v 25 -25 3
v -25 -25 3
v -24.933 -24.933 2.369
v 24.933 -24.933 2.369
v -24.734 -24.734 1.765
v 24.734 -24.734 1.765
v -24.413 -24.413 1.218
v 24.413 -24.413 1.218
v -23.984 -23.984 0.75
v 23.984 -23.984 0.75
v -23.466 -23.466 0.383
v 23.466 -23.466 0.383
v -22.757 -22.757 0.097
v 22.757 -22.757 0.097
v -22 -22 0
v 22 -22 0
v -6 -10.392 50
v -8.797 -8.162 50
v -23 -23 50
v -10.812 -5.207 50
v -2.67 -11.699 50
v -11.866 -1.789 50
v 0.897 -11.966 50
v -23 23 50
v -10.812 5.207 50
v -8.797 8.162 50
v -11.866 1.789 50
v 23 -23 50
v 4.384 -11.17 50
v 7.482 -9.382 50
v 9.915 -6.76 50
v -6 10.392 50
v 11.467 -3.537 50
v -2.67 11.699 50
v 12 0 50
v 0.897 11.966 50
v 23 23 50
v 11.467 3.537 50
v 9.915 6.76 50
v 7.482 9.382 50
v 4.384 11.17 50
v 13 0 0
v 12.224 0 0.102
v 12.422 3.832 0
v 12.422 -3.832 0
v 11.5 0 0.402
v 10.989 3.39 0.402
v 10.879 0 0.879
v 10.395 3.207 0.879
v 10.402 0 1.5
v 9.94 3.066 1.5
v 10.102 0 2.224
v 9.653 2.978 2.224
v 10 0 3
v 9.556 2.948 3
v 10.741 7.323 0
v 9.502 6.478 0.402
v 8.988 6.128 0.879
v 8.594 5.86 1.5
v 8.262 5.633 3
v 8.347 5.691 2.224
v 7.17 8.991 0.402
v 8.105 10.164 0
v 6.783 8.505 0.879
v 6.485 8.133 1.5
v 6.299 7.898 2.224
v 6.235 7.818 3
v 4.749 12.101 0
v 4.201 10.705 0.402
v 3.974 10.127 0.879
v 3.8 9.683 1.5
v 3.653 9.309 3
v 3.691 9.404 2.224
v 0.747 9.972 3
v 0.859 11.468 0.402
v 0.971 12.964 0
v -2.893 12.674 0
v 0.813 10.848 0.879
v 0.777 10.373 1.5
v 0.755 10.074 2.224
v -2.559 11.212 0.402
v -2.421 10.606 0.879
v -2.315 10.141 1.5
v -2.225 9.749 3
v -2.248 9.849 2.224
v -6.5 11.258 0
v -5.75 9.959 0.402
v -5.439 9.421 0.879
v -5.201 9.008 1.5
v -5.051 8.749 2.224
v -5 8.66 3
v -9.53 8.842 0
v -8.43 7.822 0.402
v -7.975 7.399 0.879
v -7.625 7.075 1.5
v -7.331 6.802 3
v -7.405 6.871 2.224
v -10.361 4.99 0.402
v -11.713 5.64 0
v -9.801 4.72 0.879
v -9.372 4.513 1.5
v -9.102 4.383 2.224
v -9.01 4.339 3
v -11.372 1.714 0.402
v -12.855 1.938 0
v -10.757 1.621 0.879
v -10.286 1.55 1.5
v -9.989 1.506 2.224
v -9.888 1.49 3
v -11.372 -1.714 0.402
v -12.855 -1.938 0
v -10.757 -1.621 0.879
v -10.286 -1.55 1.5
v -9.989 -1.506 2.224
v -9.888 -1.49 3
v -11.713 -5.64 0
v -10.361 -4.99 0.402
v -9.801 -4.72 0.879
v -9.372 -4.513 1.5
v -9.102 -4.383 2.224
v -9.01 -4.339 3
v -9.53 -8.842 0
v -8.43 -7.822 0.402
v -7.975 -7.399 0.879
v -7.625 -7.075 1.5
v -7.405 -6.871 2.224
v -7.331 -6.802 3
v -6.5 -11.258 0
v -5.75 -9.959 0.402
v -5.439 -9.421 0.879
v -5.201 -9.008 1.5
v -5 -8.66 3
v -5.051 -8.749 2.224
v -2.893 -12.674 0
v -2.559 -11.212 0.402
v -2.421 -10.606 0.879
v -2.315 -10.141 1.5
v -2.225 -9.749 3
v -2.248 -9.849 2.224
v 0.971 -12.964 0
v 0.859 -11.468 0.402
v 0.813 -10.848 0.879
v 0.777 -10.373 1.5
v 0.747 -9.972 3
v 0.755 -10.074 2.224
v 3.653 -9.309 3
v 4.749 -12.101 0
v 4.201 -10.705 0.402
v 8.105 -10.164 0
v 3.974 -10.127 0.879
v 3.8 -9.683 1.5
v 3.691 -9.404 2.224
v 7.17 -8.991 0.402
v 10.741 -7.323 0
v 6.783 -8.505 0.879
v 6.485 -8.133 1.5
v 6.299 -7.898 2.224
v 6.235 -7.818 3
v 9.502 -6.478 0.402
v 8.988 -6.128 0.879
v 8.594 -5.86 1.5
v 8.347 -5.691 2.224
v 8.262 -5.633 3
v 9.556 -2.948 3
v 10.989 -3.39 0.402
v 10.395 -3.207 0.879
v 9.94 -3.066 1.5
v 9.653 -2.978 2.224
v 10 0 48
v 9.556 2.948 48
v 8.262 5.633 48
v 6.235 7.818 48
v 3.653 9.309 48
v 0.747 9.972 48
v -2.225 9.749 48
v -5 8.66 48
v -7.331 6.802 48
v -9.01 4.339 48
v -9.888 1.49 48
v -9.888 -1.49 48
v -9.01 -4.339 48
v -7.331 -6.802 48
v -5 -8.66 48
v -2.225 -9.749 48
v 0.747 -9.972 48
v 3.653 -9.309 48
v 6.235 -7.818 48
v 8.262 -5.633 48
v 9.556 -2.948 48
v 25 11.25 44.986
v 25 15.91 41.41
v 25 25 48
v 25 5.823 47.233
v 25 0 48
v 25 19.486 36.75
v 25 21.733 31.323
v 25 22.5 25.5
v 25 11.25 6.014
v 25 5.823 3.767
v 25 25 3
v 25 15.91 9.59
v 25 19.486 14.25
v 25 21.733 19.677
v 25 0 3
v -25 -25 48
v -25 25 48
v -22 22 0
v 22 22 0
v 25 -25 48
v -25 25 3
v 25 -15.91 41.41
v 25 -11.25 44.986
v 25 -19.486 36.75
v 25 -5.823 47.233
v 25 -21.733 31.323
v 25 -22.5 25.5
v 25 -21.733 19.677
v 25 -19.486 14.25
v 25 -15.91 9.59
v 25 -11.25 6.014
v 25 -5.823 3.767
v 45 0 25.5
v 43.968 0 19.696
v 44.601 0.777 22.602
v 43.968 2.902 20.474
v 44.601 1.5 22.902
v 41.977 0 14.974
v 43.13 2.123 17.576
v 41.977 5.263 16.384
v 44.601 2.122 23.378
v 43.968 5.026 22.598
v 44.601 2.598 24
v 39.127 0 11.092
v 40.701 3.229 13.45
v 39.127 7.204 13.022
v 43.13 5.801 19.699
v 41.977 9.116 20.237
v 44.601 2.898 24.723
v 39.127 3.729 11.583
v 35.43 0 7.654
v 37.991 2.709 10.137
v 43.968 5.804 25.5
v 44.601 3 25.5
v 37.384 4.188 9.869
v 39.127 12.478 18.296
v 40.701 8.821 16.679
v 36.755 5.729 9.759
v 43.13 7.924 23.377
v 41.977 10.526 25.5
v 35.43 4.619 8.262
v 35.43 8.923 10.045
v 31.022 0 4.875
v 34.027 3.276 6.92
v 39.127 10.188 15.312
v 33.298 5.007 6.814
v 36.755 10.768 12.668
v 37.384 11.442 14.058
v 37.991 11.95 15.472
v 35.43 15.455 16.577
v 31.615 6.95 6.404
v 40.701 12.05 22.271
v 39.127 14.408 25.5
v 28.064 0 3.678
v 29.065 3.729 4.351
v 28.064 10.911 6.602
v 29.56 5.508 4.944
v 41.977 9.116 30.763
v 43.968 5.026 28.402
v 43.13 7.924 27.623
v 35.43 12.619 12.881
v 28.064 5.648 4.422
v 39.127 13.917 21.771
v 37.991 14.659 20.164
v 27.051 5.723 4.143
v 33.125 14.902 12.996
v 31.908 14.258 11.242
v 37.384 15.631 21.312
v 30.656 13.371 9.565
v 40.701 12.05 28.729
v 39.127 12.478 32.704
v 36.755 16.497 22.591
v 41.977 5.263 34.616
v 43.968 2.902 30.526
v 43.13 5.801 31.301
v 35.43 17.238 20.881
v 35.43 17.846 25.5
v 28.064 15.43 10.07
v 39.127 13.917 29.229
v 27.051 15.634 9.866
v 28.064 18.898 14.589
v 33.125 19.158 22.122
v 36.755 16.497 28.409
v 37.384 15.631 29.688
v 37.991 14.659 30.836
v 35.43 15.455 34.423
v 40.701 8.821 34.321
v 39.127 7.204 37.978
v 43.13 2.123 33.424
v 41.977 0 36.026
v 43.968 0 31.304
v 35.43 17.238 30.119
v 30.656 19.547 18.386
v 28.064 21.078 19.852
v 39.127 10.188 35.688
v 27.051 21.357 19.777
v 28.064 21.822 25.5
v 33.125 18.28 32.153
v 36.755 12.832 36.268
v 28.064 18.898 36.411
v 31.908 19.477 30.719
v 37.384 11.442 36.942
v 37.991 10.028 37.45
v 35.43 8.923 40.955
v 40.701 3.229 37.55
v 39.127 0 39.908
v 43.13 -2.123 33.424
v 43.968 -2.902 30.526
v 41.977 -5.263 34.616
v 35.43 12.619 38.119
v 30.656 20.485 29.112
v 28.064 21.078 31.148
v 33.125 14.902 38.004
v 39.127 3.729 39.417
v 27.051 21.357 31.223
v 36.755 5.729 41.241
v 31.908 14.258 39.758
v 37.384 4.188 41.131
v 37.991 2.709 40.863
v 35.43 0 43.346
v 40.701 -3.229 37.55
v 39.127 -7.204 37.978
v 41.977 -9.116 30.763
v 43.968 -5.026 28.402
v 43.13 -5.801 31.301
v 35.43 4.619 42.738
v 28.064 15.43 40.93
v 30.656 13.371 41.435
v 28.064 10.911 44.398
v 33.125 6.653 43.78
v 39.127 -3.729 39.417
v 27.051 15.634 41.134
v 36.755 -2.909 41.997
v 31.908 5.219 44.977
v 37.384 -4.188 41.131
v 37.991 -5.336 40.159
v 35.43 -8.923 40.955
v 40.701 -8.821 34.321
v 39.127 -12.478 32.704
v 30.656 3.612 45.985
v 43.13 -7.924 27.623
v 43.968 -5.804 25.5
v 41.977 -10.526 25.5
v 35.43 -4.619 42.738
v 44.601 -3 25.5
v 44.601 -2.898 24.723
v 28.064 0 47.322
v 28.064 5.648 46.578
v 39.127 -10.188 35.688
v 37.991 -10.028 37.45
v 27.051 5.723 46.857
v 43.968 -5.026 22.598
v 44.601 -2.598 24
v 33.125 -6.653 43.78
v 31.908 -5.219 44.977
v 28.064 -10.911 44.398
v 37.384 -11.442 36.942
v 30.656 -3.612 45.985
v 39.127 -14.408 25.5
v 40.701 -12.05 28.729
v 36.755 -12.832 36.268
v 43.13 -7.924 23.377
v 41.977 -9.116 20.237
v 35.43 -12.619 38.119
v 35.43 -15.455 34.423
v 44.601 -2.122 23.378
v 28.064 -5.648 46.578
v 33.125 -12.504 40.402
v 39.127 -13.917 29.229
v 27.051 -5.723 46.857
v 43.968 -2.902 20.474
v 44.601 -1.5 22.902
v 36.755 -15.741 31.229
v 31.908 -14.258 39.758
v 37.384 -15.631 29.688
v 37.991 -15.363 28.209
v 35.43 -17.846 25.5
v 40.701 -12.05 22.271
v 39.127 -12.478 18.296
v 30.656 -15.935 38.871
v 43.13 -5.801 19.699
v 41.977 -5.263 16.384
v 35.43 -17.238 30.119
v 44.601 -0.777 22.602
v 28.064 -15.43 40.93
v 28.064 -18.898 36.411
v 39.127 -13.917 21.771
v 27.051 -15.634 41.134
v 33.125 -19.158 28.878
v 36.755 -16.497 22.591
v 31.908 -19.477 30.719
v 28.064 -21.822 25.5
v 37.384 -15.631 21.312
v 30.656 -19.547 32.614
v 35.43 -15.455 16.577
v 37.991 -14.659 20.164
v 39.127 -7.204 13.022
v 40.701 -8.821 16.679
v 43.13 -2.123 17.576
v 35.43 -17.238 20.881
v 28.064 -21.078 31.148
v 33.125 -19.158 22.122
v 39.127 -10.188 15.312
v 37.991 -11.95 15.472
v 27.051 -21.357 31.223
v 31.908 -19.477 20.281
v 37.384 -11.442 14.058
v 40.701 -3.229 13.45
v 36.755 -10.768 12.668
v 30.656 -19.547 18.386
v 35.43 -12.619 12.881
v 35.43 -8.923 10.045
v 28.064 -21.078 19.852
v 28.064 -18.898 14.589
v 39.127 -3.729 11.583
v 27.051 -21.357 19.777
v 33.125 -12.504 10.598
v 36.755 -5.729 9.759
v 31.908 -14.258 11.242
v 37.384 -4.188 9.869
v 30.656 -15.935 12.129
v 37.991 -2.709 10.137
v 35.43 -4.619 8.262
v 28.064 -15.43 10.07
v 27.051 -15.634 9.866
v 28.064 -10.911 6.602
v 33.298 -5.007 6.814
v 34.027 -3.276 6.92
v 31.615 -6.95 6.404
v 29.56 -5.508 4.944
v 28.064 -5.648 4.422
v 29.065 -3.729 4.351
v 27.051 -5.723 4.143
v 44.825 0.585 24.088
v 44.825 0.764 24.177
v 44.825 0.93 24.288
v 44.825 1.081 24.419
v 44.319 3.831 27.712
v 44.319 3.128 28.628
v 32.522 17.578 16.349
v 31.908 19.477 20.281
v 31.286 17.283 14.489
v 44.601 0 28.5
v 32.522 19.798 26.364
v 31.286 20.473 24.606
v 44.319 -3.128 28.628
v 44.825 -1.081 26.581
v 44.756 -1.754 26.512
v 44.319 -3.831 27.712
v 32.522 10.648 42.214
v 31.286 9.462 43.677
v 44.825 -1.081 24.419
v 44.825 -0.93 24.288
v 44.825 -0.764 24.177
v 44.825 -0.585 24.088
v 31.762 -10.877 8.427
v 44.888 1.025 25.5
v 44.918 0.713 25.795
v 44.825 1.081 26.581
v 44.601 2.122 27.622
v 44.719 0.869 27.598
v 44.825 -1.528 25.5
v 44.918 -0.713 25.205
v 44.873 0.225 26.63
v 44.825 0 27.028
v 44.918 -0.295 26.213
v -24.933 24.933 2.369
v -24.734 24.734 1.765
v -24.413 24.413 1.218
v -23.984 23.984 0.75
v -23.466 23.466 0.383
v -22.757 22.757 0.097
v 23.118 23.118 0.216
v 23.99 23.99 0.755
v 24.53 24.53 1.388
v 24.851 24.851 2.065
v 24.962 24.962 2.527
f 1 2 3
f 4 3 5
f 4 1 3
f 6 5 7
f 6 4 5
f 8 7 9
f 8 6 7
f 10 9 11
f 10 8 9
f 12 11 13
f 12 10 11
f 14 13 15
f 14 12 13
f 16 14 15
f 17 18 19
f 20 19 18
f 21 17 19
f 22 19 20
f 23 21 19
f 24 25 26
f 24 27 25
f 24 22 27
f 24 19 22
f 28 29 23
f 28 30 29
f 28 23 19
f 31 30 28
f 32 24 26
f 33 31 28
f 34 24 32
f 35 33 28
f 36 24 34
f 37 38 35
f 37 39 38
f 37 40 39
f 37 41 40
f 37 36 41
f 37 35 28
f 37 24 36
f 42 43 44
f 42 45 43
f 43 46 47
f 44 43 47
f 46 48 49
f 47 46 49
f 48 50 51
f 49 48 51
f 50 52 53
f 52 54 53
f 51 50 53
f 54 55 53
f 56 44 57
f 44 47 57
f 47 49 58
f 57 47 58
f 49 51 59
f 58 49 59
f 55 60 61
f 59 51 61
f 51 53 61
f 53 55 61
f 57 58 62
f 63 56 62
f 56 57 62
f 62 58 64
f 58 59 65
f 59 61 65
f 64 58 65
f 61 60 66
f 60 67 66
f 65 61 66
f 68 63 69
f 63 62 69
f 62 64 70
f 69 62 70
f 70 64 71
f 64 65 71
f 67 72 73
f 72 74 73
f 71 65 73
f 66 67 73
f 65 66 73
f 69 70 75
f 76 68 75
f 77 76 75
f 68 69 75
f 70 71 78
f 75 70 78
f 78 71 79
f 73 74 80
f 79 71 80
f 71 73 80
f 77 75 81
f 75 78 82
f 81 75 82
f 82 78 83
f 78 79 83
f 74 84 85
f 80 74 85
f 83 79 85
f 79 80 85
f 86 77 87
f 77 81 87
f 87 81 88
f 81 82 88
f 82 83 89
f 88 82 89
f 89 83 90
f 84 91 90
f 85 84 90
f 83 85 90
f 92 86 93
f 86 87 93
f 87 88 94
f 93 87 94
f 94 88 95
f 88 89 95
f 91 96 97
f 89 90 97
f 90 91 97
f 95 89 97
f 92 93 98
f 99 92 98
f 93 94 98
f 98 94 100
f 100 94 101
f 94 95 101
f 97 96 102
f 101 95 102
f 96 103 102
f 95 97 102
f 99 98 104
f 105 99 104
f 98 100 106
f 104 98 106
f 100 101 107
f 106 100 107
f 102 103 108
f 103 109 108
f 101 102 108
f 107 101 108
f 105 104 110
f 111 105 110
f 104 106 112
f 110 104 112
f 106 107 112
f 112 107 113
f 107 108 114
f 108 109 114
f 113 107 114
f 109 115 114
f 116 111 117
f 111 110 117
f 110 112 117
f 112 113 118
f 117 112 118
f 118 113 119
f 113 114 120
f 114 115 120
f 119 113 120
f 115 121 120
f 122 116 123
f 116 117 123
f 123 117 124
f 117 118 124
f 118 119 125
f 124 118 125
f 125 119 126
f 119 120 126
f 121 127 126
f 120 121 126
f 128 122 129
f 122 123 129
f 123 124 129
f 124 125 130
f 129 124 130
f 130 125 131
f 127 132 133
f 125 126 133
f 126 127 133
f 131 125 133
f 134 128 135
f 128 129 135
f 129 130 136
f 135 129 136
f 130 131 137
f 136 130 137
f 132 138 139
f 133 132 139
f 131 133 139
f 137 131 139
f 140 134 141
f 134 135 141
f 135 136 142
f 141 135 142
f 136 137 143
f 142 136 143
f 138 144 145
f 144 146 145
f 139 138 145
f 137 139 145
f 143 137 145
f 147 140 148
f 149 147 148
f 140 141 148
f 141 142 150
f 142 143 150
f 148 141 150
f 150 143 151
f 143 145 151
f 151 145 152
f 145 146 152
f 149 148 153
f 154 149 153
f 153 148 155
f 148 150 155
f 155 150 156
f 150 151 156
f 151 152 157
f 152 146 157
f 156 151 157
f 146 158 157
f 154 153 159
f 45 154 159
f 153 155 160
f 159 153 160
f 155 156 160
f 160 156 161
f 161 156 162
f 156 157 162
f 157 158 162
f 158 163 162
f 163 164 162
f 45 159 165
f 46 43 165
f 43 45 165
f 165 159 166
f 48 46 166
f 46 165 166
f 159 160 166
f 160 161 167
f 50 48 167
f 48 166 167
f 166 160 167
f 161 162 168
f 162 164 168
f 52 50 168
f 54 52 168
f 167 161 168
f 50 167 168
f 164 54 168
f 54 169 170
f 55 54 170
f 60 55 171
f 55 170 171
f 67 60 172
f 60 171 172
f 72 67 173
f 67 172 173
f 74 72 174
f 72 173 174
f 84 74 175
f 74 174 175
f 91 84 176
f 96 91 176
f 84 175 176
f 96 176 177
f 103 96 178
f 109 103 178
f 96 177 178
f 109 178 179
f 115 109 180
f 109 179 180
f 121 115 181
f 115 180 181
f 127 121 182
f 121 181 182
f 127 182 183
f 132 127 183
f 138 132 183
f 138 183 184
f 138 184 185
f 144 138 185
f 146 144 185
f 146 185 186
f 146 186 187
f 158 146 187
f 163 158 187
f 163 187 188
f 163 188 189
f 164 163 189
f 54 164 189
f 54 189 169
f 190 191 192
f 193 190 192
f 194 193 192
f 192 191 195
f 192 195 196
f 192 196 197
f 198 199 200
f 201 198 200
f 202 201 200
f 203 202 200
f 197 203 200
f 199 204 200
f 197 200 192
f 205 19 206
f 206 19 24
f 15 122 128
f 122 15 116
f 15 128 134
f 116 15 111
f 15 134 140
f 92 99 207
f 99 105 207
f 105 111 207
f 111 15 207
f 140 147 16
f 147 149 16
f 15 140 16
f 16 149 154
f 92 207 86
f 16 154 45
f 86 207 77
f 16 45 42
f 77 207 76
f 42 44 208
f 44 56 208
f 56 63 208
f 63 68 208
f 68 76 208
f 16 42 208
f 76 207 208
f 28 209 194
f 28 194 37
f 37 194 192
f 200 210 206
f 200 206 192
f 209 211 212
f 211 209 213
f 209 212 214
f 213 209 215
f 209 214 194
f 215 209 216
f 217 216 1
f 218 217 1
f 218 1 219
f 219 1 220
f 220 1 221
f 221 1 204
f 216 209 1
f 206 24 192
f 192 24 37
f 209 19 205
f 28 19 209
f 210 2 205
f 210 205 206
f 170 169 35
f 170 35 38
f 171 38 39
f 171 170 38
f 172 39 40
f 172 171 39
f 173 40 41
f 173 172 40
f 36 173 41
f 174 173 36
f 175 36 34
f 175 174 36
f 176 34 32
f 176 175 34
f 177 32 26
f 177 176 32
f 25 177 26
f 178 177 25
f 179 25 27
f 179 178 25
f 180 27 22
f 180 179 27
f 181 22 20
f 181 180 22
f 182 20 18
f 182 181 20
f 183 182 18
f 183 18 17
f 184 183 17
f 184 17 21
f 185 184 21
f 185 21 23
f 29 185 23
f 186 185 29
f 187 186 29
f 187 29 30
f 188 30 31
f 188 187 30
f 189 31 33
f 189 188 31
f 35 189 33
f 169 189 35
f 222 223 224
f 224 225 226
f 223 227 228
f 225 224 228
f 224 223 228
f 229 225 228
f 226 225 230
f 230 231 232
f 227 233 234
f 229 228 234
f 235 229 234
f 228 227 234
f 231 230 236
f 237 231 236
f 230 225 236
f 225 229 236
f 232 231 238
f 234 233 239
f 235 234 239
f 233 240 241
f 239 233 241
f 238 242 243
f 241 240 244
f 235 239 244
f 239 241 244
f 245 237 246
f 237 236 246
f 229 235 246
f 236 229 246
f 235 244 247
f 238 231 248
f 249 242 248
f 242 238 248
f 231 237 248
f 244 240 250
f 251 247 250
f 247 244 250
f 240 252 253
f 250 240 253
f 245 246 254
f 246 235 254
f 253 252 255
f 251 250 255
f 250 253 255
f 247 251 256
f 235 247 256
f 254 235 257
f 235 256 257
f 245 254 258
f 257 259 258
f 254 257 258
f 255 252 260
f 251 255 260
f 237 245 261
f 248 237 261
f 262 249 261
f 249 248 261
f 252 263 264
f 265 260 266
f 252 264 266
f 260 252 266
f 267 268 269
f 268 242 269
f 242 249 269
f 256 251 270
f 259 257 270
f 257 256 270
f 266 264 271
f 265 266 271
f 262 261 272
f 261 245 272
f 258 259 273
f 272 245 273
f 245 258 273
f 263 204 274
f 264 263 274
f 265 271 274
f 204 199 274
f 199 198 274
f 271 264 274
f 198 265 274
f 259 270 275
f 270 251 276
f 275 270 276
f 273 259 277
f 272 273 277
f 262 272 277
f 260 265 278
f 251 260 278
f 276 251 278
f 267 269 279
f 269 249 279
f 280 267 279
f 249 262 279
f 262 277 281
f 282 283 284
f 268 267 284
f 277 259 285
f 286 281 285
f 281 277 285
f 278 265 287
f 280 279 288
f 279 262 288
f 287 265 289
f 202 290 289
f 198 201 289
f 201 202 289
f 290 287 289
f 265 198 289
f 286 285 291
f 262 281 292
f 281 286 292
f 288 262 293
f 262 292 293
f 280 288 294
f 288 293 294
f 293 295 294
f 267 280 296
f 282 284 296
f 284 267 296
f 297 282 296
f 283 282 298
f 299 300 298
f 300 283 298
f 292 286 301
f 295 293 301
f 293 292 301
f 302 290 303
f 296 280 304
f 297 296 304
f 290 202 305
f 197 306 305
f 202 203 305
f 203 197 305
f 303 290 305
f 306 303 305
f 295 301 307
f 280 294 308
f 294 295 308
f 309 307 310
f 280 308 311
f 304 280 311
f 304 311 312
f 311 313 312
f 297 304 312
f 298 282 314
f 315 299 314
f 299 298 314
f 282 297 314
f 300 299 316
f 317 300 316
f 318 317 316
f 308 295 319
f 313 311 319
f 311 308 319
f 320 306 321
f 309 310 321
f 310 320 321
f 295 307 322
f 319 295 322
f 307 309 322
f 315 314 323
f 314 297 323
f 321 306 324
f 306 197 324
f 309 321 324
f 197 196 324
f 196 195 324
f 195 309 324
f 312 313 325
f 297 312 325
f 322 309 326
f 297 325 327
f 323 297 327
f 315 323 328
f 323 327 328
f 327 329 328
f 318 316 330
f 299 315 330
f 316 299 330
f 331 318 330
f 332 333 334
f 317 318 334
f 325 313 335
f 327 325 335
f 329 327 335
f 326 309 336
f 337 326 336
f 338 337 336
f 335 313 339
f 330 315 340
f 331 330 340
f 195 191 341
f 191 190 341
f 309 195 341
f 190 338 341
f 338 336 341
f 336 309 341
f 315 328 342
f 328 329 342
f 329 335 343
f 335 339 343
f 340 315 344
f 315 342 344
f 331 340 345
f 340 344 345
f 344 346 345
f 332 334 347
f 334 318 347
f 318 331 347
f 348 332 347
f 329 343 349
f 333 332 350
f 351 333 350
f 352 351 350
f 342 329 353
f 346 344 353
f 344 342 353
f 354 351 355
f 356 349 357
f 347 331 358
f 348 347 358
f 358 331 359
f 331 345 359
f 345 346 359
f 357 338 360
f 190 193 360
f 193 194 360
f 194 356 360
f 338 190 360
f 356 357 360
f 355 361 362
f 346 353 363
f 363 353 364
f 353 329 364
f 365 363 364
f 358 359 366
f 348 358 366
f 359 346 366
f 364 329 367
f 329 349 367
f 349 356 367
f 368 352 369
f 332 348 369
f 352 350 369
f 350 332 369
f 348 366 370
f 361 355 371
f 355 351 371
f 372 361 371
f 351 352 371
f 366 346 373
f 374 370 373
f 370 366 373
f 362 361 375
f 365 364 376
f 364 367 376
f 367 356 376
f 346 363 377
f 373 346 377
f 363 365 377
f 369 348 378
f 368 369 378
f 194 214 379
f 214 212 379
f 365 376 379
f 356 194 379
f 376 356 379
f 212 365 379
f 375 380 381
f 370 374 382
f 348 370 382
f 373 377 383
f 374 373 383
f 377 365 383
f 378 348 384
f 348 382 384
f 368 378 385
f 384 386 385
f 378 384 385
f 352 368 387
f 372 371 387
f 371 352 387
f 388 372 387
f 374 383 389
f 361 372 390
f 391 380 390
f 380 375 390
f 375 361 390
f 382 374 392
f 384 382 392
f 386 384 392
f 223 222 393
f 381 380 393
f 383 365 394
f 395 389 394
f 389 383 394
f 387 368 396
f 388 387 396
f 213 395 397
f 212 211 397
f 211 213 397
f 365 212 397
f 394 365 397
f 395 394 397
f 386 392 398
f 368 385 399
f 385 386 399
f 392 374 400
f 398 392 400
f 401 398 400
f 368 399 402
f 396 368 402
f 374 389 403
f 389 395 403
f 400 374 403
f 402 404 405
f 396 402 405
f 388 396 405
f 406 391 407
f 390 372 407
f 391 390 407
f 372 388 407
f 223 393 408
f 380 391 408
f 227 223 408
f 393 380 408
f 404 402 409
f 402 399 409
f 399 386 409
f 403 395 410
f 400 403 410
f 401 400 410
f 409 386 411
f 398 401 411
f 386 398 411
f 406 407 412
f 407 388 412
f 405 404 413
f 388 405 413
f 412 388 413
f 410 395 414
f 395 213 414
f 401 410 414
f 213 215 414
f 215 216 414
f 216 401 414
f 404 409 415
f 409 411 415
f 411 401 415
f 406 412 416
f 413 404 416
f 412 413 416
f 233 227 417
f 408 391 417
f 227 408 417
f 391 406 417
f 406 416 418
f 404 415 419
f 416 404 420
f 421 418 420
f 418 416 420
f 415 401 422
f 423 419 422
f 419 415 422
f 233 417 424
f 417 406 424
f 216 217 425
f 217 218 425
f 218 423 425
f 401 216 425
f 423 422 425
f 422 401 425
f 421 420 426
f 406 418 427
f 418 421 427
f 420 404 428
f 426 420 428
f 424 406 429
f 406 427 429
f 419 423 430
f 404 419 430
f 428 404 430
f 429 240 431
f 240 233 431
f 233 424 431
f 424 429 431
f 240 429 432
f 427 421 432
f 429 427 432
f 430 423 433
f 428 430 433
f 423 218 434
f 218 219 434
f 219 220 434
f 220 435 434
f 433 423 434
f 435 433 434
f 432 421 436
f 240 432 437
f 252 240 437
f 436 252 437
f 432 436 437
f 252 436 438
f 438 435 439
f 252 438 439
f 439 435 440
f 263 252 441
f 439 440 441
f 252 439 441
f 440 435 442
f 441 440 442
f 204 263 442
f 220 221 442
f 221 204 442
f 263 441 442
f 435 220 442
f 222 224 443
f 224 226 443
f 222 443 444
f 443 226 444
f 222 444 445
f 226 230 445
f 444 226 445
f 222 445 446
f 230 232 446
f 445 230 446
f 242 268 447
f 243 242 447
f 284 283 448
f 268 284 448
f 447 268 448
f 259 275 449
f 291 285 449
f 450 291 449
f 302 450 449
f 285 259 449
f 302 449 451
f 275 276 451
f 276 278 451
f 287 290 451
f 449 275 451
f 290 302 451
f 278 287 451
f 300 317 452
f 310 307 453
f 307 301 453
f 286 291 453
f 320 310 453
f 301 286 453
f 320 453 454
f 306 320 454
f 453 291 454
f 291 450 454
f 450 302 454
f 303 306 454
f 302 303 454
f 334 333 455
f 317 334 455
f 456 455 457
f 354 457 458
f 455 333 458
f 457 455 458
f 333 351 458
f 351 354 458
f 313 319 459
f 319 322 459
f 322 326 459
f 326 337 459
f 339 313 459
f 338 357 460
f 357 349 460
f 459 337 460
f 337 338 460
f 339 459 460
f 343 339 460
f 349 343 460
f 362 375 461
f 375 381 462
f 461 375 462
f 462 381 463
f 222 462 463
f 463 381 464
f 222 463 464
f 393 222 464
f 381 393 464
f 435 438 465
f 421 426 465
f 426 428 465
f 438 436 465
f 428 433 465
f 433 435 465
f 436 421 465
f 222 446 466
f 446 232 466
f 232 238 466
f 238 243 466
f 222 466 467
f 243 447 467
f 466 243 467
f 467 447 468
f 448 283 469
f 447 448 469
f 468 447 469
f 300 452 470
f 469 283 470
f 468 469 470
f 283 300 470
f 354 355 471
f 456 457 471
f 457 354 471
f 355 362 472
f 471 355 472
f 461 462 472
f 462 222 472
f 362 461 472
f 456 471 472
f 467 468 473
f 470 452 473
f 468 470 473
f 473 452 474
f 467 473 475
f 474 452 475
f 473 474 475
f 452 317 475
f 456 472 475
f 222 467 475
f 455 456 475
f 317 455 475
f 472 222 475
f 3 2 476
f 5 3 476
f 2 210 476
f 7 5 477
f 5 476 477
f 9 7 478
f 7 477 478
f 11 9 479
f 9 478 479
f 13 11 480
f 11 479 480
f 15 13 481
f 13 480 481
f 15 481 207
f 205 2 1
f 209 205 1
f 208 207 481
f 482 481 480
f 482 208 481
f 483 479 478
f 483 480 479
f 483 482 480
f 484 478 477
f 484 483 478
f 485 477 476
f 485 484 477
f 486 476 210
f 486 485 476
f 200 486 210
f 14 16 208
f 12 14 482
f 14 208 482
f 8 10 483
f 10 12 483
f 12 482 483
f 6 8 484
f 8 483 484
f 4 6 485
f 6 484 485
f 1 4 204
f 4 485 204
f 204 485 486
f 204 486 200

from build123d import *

# Parameters (mm, degrees)
F0_W     = 50
F0_H     = 50
F1_DEPTH = 50
F2_R     = 10
F3_DEPTH = 50.001
F4_SIZE  = 2
F5_R     = 3


with BuildPart() as f1:
    # F0 (on Top) → F1 (new body)
    with BuildSketch(Plane.XY):
        Rectangle(F0_W, F0_H)
    extrude(amount=F1_DEPTH)

    # F2 (on face) → F3 (cut, through all)
    with BuildSketch(Plane.XY.offset(50)):
        Circle(F2_R)
    extrude(amount=-F3_DEPTH, mode=Mode.SUBTRACT)

    # F4
    f4_edges = [f1.edges().sort_by_distance(p)[0] for p in [
        (0, -25, 50),
        (-25, 0, 50),
        (25, 0, 50),
        (0, 25, 50),
        (-10, 0, 50),
    ]]
    chamfer(f4_edges, length=F4_SIZE)

    # F5
    f5_edges = [f1.edges().sort_by_distance(p)[0] for p in [
        (0, -25, 0),
        (-25, 0, 0),
        (25, 0, 0),
        (0, 25, 0),
        (-10, 0, 0),
    ]]
    fillet(f5_edges, radius=F5_R)

    # F6 (on Front) → F7 (revolve)
    with BuildSketch(Plane.XZ):
        with BuildLine():
            Line((45, 25.5), (25, 25.5))
            Line((25, 25.5), (25, 3))
            add(Edge.make_bspline(
                [(45, 25.5), (44.5258021355, 20.7176618278), (42.3149203915, 12.2219088735), (31.248183921, 3.7772532087), (25, 3)],
                knots=[0, 0, 0, 0, 0.4587105615, 1, 1, 1, 1], degree=3))
        make_face()
    revolve(axis=Axis((35, 0, 25.5), (1, 0, 0)))


solid = f1.part
